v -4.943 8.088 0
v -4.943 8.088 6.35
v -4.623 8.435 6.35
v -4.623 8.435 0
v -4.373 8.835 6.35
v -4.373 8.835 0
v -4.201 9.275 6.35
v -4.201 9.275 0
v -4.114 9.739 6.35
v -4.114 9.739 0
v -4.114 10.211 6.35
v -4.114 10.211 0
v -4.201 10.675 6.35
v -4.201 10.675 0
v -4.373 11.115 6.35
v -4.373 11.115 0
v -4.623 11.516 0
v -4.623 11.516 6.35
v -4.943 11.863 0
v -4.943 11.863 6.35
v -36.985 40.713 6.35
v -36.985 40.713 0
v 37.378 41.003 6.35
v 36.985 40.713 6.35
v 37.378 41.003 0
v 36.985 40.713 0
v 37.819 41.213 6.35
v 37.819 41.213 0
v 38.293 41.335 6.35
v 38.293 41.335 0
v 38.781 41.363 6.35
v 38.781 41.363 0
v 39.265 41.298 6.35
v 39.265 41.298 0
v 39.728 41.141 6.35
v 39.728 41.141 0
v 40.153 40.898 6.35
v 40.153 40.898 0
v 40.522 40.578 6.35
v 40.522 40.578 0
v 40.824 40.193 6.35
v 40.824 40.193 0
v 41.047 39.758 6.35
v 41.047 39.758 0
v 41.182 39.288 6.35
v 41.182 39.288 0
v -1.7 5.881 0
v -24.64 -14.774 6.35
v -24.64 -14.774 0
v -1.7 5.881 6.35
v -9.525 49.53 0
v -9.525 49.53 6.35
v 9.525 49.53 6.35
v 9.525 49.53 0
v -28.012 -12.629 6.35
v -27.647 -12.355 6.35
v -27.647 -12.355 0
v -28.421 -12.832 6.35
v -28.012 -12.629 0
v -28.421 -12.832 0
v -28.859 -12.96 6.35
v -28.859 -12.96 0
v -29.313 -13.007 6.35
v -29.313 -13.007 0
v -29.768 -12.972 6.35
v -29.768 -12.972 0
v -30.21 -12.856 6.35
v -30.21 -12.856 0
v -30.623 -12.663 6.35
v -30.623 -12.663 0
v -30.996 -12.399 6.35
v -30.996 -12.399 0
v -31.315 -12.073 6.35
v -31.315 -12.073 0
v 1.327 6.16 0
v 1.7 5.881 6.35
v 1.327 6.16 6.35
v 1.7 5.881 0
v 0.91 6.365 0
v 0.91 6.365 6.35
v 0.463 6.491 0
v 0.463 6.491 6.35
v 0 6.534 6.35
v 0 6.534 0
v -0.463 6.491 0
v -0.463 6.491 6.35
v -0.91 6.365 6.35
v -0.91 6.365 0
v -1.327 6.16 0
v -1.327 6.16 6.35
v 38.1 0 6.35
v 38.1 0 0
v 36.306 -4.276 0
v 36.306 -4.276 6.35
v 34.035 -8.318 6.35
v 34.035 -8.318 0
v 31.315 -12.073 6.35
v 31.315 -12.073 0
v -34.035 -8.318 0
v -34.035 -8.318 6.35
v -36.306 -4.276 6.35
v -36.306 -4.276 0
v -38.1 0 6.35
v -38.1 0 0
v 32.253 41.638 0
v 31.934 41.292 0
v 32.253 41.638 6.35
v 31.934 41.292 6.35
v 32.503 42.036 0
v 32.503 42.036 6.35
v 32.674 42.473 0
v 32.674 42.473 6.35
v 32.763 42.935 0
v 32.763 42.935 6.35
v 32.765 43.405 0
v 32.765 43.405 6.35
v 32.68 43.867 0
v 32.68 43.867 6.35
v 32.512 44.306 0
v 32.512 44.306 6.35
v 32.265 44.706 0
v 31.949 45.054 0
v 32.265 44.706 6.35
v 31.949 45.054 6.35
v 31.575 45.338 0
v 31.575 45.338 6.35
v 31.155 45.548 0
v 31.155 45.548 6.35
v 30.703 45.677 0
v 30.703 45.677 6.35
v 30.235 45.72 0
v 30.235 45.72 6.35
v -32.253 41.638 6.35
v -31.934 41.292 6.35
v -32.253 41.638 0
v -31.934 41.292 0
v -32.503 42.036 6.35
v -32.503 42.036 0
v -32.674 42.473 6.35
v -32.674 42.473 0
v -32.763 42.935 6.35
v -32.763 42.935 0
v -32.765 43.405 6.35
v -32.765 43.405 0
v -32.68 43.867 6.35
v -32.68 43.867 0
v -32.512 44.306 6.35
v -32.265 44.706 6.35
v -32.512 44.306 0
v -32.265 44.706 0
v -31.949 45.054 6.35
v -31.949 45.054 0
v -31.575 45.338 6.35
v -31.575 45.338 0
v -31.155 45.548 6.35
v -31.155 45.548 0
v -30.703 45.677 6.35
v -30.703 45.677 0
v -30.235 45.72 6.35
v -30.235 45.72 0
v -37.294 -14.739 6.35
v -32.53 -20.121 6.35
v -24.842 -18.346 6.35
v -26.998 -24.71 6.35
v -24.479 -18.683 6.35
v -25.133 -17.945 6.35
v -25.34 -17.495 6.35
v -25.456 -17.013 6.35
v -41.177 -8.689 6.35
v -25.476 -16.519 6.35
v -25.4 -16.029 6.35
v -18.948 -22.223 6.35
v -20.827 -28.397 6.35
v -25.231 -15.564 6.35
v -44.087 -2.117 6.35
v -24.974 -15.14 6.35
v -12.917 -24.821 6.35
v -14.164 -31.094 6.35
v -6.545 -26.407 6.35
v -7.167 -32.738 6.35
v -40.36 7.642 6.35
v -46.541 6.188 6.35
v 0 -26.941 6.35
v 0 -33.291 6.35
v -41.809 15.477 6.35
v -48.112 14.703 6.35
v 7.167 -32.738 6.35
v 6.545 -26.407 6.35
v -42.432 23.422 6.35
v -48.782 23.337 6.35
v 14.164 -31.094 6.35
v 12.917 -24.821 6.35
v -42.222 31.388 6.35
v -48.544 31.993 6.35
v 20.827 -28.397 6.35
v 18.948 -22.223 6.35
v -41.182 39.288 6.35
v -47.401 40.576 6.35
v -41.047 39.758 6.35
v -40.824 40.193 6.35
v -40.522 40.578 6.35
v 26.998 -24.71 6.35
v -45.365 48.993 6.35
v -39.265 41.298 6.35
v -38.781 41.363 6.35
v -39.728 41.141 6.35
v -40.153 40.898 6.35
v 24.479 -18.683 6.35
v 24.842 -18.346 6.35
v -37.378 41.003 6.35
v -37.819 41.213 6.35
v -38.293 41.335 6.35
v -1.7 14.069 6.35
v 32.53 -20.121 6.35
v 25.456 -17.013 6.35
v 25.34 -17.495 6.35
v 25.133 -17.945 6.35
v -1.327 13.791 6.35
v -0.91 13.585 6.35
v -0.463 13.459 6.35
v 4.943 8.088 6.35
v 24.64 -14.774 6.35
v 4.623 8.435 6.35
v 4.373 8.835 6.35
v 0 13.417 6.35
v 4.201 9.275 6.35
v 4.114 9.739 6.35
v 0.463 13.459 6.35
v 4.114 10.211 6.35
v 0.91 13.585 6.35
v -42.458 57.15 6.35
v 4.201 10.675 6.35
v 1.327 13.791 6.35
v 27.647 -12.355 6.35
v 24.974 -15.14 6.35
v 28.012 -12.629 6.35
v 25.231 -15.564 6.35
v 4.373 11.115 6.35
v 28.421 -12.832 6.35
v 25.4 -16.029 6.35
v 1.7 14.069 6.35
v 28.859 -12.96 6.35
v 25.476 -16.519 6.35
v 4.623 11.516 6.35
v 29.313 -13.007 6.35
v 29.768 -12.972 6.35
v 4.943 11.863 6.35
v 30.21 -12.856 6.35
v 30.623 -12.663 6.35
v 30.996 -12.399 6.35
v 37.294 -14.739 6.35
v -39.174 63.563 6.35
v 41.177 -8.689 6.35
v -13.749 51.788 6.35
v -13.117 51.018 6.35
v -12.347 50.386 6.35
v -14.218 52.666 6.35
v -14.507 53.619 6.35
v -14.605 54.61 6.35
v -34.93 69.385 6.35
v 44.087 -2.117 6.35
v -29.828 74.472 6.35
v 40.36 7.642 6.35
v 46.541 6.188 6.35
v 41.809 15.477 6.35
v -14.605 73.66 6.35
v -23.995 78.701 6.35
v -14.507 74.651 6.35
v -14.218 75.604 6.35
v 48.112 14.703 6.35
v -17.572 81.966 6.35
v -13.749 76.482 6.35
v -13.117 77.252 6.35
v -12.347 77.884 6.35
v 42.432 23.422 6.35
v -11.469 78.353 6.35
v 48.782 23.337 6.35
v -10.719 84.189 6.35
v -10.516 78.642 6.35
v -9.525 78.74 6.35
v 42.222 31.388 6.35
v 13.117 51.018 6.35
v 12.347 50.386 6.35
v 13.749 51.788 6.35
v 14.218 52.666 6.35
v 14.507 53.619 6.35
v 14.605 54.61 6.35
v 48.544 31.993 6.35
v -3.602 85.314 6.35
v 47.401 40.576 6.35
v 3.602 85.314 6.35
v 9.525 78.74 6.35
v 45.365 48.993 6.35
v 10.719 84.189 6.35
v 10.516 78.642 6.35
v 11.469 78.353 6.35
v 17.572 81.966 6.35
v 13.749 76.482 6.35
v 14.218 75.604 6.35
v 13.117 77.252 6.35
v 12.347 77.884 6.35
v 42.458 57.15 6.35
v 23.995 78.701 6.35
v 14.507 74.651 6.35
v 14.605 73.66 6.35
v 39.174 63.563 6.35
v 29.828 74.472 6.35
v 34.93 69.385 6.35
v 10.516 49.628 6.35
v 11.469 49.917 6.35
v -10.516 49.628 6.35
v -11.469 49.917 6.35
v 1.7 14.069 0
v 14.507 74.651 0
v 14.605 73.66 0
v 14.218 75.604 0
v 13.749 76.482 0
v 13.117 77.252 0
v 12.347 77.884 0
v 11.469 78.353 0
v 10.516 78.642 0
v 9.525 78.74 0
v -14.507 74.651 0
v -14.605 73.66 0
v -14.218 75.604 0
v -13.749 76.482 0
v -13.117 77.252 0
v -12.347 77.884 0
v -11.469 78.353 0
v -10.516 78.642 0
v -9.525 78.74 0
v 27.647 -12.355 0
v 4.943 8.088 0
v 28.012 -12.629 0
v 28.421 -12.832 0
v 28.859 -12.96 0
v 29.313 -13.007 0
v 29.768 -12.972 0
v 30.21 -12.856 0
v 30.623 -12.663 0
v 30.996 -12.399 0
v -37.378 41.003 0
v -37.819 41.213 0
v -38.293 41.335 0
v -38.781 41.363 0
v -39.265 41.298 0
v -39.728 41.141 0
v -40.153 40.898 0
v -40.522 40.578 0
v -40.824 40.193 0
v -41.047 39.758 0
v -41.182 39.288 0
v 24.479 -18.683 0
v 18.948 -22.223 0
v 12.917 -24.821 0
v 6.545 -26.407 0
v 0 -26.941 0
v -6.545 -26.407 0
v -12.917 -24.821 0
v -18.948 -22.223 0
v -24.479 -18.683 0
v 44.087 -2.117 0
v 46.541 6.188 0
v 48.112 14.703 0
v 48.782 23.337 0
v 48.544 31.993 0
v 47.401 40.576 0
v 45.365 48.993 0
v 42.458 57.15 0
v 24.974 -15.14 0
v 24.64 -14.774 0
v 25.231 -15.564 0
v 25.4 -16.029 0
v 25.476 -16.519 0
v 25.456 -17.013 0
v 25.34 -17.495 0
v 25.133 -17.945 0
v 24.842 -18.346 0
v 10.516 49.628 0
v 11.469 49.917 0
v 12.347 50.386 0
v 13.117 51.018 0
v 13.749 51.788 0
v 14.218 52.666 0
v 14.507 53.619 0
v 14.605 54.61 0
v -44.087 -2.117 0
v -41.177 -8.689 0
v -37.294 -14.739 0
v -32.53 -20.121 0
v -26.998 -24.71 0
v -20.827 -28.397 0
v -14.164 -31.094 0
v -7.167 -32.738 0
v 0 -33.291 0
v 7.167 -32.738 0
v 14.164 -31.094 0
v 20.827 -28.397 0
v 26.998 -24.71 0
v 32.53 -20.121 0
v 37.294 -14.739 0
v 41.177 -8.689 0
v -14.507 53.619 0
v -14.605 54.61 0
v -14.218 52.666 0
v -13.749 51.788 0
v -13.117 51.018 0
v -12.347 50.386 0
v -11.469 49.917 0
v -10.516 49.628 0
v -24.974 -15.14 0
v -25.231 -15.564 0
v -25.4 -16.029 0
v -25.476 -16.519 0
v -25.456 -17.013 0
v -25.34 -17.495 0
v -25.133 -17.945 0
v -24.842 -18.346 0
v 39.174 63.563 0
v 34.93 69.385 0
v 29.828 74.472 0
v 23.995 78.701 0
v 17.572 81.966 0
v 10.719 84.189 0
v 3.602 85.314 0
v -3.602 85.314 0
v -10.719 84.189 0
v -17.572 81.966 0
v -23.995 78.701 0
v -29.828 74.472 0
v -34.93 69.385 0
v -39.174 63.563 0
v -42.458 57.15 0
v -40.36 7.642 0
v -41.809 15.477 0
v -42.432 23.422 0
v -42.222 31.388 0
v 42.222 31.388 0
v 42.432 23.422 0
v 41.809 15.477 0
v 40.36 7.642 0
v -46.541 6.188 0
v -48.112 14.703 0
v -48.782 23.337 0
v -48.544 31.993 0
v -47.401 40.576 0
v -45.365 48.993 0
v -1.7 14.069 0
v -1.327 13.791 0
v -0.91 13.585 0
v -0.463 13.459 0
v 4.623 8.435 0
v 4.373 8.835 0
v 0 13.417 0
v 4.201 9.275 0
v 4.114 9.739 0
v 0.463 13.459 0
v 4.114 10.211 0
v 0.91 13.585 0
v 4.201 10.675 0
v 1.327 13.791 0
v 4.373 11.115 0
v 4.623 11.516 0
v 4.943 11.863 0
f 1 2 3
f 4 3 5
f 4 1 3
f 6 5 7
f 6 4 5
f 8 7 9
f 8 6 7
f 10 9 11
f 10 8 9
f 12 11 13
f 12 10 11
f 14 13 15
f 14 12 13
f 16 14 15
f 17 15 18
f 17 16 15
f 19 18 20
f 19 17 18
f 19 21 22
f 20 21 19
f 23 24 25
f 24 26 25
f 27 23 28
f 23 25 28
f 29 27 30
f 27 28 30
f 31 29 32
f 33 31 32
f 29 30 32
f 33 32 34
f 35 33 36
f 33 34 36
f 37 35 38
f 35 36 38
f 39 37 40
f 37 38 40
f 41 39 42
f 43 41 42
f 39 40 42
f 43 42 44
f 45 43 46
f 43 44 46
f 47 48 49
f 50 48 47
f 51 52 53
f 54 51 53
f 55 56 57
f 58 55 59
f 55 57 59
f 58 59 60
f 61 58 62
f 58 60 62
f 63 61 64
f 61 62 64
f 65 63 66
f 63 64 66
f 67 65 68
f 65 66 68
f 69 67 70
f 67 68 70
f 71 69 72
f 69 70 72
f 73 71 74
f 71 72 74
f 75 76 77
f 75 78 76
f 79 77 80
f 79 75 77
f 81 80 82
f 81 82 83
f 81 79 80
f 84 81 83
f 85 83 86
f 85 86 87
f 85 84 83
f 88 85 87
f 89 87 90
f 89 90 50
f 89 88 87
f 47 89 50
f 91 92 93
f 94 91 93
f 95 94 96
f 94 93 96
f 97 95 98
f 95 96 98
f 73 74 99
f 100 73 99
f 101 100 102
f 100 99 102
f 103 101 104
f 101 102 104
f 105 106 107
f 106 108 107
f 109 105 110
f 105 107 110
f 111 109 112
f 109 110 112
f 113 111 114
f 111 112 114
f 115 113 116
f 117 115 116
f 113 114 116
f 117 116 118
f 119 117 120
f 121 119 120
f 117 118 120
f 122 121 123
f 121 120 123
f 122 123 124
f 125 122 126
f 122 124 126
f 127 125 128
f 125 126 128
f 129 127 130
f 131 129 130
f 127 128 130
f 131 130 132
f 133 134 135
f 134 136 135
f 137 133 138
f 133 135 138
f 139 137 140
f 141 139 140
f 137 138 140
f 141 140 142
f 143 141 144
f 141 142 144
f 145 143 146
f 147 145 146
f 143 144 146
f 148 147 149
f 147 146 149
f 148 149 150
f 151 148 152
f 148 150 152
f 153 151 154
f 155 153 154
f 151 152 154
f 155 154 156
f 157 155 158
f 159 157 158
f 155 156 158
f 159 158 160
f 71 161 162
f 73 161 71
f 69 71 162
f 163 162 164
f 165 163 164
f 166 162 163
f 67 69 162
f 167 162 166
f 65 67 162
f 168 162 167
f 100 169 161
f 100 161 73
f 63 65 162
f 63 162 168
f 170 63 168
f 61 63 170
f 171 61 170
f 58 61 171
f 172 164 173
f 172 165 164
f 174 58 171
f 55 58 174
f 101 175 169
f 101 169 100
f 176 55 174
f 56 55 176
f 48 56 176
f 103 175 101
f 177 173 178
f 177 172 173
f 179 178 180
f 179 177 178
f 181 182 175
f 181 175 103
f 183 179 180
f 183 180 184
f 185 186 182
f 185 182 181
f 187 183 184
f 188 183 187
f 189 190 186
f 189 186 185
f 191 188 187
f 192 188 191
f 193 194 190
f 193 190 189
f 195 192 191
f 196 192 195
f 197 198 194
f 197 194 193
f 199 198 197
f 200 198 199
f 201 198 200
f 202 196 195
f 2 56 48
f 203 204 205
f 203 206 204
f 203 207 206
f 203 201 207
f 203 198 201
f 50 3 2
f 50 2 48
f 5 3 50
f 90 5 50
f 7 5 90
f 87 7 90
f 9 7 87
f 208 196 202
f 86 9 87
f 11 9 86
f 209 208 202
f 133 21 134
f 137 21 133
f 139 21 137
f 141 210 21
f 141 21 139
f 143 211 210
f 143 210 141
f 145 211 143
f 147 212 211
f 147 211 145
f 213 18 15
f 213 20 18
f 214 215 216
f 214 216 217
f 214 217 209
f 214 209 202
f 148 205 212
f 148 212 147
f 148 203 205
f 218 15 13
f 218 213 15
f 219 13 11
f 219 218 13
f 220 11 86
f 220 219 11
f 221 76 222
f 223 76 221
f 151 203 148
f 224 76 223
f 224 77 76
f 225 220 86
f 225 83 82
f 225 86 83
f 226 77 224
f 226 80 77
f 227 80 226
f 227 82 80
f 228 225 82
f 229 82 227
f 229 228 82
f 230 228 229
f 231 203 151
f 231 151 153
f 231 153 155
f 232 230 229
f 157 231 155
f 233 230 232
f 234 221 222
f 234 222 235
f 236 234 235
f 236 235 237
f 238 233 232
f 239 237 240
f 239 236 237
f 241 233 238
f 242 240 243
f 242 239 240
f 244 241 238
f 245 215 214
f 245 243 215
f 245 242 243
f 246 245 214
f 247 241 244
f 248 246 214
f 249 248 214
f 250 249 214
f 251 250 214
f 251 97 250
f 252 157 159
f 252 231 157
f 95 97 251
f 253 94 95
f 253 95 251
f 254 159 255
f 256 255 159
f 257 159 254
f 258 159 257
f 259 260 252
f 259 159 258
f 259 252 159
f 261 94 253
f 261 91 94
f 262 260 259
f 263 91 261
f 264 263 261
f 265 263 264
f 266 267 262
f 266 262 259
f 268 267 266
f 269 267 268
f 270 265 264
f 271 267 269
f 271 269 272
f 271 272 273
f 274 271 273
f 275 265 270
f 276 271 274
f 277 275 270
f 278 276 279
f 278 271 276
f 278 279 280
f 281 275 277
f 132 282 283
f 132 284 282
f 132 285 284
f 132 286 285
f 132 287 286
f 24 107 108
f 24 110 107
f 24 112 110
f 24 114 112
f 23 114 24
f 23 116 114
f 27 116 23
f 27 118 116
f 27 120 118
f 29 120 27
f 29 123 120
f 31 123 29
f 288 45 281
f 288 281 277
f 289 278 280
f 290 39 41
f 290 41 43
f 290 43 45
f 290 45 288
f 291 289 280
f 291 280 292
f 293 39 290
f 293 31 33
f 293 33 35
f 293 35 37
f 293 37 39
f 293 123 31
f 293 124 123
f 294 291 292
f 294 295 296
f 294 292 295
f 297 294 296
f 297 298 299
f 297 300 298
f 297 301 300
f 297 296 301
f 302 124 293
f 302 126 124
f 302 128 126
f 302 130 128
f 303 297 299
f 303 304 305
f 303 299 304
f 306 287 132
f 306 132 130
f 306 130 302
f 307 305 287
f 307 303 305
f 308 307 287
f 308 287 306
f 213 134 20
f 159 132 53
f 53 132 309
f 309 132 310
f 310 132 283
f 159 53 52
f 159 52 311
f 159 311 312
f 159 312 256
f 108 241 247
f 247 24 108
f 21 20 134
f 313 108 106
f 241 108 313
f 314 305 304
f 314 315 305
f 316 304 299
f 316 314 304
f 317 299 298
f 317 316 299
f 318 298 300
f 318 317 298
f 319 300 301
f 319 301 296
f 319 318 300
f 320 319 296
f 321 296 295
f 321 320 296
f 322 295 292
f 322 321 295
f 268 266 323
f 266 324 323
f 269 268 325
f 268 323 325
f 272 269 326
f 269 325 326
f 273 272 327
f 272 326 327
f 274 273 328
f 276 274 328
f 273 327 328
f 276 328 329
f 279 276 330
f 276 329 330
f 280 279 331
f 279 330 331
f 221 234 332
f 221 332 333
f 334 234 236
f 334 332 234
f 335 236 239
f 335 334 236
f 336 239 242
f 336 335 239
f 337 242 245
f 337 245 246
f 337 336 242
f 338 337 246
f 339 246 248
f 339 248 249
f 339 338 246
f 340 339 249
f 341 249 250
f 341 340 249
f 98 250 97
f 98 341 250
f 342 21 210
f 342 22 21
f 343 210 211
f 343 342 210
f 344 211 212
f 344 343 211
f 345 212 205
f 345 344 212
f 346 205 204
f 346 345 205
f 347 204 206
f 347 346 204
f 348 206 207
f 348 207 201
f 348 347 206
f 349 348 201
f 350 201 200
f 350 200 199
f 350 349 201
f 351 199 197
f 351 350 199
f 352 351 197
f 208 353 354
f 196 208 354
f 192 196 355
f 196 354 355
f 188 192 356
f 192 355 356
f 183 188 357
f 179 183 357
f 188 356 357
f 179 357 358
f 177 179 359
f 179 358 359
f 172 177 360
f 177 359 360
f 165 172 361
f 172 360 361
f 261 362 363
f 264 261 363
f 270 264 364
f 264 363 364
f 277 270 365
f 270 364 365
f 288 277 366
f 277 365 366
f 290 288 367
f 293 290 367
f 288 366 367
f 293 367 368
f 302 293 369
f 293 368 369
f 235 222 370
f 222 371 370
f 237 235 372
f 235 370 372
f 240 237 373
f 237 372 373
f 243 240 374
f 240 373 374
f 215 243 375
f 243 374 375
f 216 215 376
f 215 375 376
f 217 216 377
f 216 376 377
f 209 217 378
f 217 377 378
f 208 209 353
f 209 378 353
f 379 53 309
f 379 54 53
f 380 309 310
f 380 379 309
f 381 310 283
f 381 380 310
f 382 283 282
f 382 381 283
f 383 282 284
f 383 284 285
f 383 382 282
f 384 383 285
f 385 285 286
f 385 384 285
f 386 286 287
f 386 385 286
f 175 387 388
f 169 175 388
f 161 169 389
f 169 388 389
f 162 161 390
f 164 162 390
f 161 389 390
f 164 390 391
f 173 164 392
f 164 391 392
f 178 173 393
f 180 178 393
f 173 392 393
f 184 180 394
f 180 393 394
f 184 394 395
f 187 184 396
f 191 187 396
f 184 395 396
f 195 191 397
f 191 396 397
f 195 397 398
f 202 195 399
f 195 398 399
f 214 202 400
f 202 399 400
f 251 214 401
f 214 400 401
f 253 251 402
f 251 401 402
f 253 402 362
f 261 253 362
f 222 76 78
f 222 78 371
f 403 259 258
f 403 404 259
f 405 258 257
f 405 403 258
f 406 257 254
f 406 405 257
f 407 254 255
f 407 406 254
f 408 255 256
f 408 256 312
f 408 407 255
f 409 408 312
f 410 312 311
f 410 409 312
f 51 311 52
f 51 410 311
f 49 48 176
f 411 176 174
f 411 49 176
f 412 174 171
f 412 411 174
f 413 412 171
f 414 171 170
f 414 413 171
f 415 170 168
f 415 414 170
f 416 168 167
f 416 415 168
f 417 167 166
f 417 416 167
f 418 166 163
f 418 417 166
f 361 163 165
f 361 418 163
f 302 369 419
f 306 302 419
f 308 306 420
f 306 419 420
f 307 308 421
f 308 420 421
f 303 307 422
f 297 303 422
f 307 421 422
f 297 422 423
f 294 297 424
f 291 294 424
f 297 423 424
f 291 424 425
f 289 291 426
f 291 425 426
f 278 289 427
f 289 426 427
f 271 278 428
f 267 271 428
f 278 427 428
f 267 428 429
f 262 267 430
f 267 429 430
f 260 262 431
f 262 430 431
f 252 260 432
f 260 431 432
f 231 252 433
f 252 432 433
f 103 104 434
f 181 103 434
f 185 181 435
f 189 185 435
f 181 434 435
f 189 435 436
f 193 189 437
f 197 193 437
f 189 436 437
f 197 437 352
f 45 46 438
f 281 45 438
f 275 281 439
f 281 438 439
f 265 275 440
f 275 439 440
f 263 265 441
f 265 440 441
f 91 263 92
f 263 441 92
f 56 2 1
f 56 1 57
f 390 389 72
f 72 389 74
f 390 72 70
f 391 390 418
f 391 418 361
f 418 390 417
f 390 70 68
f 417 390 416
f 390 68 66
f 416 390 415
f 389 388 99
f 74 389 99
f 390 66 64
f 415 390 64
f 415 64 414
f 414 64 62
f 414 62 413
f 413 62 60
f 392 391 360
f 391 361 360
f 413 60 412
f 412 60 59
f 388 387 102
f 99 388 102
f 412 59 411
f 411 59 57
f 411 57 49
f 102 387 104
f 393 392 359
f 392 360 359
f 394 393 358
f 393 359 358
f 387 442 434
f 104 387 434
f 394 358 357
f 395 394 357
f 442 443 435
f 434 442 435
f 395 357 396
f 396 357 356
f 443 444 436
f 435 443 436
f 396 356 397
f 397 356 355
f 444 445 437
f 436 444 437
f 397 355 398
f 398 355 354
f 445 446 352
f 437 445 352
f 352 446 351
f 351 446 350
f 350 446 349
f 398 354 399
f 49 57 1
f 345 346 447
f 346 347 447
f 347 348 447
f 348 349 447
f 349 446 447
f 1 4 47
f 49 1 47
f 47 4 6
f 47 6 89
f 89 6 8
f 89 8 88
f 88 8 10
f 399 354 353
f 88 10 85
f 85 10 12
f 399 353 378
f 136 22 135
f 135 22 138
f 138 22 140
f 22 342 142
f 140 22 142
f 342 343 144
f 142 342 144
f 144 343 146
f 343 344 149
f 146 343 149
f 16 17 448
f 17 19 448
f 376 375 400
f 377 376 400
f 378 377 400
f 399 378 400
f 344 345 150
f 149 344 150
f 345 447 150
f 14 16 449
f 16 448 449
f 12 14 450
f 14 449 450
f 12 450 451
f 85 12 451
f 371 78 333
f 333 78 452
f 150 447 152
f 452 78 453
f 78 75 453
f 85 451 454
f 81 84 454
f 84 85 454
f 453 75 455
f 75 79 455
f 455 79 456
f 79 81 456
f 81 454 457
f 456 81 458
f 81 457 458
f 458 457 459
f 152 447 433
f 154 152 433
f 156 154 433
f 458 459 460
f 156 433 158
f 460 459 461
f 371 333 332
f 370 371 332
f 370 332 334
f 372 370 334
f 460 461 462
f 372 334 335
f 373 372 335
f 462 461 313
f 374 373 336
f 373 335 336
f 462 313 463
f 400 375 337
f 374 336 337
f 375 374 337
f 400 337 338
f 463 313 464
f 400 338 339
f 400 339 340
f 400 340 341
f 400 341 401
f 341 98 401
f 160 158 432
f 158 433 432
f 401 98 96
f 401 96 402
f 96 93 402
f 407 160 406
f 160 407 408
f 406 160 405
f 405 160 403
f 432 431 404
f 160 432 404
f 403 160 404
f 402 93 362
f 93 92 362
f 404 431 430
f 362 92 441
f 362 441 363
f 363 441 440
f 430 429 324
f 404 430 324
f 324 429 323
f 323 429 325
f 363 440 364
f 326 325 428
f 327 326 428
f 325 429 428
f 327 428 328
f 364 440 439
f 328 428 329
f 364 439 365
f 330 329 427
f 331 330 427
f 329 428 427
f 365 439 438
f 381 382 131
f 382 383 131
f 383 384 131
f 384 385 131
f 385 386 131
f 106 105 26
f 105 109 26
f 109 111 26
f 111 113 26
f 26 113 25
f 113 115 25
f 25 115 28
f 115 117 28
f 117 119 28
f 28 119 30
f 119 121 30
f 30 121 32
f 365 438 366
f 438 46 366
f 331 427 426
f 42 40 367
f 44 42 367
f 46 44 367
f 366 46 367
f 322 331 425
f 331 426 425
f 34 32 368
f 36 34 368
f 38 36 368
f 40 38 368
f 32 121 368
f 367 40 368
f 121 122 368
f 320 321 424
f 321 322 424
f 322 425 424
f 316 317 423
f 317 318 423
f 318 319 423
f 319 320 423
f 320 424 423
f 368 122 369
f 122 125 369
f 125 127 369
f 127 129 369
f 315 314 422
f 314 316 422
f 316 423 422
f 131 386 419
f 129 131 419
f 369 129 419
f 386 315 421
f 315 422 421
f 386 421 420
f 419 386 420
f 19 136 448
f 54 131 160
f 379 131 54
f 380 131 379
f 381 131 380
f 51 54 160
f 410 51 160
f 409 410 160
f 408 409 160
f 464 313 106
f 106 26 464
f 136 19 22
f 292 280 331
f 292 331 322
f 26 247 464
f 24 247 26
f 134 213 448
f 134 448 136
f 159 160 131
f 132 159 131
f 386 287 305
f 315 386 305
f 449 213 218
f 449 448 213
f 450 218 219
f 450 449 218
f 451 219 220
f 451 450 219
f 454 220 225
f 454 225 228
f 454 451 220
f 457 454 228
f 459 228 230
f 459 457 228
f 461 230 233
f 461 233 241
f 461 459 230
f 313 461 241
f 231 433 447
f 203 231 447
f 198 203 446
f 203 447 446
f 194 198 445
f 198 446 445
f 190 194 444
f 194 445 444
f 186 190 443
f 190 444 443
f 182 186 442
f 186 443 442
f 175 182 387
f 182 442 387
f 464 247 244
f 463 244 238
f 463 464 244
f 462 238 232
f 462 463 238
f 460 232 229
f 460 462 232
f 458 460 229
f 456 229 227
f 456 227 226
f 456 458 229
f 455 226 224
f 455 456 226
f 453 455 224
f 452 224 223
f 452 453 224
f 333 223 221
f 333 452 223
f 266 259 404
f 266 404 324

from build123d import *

# Parameters (mm, degrees)
BOSS_EXTRUDE1_DEPTH = 6.35
CUT_EXTRUDE1_REACH  = 8.35
SKETCH2_W           = 29.21
SKETCH2_H           = 29.21
FILLET1_R           = 5.08
BOSS_EXTRUDE2_DEPTH = 6.35
FILLET2_R           = 2.54


with BuildPart() as part:
    # Sketch1 → Boss-Extrude1 (new body)
    with BuildSketch(Plane.XY):
        with BuildLine():
            ThreePointArc((42.457951031, 57.15), (0, 85.455300688), (-42.457951031, 57.15))
            ThreePointArc((-42.457951031, 57.15), (-48.776790726, 27.667949622), (-44.086837414, -2.116666667))
            ThreePointArc((-44.086837414, -2.116666667), (0, -33.290768363), (44.086837414, -2.116666667))
            ThreePointArc((44.086837414, -2.116666667), (48.776790726, 27.667949622), (42.457951031, 57.15))
        make_face()
        with BuildLine():
            ThreePointArc((-38.1, 0), (-42.411411047, 22.737195516), (-39.698659089, 45.72))
            Line((-39.698659089, 45.72), (39.698659089, 45.72))
            ThreePointArc((39.698659089, 45.72), (42.411411047, 22.737195516), (38.1, 0))
            ThreePointArc((38.1, 0), (0, -26.940768363), (-38.1, 0))
        make_face(mode=Mode.SUBTRACT)
    extrude(amount=BOSS_EXTRUDE1_DEPTH)

    # Sketch2 → Cut-Extrude1 (cut, up to next)
    with BuildSketch(Plane.XY.offset(6.35), mode=Mode.PRIVATE) as cut_extrude1_sk1:
        with Locations((0, 64.135)):
            Rectangle(SKETCH2_W, SKETCH2_H)
    cut_extrude1_tool1 = extrude(cut_extrude1_sk1.sketch, amount=-CUT_EXTRUDE1_REACH, mode=Mode.PRIVATE) & part.part
    add(cut_extrude1_tool1.solids().sort_by_distance((0, 64.135, 6.35))[0], mode=Mode.SUBTRACT)

    # Fillet1
    fillet1_edges = [part.edges().sort_by_distance(p)[0] for p in [
        (14.605, 78.74, 3.175),
        (14.605, 49.53, 3.175),
        (-14.605, 49.53, 3.175),
        (-14.605, 78.74, 3.175),
    ]]
    fillet(fillet1_edges, radius=FILLET1_R)

    # Sketch3 → Boss-Extrude2 (add)
    with BuildSketch(Plane.XY.offset(6.35)):
        Polygon((-38.423965284, 47.135690893), (-40.973352894, 44.304309107), (-2.846977827, 9.975166803), (-31.416785414, -15.749203493), (-28.867397804, -18.580585278), (0, 7.411736453), (28.867397804, -18.580585278), (31.416785414, -15.749203493), (2.846977827, 9.975166803), (40.973352894, 44.304309107), (38.423965284, 47.135690893), (0, 12.538597153), align=None)
    extrude(amount=-BOSS_EXTRUDE2_DEPTH)

    # Fillet2
    fillet2_edges = [part.edges().sort_by_distance(p)[0] for p in [
        (-2.846977827, 9.975166803, 3.175),
        (2.846977827, 9.975166803, 3.175),
        (-40.241399563, 43.645255368, 3.175),
        (29.56358846, -14.08057746, 3.175),
        (26.831630213, -16.747571906, 3.175),
        (-36.851681262, 45.72, 3.175),
        (40.241399563, 43.645255368, 3.175),
        (36.851681262, 45.72, 3.175),
        (0, 12.538597153, 3.175),
        (-29.56358846, -14.08057746, 3.175),
        (-26.831630213, -16.747571906, 3.175),
        (0, 7.411736453, 3.175),
    ]]
    fillet(fillet2_edges, radius=FILLET2_R)


solid = part.part
